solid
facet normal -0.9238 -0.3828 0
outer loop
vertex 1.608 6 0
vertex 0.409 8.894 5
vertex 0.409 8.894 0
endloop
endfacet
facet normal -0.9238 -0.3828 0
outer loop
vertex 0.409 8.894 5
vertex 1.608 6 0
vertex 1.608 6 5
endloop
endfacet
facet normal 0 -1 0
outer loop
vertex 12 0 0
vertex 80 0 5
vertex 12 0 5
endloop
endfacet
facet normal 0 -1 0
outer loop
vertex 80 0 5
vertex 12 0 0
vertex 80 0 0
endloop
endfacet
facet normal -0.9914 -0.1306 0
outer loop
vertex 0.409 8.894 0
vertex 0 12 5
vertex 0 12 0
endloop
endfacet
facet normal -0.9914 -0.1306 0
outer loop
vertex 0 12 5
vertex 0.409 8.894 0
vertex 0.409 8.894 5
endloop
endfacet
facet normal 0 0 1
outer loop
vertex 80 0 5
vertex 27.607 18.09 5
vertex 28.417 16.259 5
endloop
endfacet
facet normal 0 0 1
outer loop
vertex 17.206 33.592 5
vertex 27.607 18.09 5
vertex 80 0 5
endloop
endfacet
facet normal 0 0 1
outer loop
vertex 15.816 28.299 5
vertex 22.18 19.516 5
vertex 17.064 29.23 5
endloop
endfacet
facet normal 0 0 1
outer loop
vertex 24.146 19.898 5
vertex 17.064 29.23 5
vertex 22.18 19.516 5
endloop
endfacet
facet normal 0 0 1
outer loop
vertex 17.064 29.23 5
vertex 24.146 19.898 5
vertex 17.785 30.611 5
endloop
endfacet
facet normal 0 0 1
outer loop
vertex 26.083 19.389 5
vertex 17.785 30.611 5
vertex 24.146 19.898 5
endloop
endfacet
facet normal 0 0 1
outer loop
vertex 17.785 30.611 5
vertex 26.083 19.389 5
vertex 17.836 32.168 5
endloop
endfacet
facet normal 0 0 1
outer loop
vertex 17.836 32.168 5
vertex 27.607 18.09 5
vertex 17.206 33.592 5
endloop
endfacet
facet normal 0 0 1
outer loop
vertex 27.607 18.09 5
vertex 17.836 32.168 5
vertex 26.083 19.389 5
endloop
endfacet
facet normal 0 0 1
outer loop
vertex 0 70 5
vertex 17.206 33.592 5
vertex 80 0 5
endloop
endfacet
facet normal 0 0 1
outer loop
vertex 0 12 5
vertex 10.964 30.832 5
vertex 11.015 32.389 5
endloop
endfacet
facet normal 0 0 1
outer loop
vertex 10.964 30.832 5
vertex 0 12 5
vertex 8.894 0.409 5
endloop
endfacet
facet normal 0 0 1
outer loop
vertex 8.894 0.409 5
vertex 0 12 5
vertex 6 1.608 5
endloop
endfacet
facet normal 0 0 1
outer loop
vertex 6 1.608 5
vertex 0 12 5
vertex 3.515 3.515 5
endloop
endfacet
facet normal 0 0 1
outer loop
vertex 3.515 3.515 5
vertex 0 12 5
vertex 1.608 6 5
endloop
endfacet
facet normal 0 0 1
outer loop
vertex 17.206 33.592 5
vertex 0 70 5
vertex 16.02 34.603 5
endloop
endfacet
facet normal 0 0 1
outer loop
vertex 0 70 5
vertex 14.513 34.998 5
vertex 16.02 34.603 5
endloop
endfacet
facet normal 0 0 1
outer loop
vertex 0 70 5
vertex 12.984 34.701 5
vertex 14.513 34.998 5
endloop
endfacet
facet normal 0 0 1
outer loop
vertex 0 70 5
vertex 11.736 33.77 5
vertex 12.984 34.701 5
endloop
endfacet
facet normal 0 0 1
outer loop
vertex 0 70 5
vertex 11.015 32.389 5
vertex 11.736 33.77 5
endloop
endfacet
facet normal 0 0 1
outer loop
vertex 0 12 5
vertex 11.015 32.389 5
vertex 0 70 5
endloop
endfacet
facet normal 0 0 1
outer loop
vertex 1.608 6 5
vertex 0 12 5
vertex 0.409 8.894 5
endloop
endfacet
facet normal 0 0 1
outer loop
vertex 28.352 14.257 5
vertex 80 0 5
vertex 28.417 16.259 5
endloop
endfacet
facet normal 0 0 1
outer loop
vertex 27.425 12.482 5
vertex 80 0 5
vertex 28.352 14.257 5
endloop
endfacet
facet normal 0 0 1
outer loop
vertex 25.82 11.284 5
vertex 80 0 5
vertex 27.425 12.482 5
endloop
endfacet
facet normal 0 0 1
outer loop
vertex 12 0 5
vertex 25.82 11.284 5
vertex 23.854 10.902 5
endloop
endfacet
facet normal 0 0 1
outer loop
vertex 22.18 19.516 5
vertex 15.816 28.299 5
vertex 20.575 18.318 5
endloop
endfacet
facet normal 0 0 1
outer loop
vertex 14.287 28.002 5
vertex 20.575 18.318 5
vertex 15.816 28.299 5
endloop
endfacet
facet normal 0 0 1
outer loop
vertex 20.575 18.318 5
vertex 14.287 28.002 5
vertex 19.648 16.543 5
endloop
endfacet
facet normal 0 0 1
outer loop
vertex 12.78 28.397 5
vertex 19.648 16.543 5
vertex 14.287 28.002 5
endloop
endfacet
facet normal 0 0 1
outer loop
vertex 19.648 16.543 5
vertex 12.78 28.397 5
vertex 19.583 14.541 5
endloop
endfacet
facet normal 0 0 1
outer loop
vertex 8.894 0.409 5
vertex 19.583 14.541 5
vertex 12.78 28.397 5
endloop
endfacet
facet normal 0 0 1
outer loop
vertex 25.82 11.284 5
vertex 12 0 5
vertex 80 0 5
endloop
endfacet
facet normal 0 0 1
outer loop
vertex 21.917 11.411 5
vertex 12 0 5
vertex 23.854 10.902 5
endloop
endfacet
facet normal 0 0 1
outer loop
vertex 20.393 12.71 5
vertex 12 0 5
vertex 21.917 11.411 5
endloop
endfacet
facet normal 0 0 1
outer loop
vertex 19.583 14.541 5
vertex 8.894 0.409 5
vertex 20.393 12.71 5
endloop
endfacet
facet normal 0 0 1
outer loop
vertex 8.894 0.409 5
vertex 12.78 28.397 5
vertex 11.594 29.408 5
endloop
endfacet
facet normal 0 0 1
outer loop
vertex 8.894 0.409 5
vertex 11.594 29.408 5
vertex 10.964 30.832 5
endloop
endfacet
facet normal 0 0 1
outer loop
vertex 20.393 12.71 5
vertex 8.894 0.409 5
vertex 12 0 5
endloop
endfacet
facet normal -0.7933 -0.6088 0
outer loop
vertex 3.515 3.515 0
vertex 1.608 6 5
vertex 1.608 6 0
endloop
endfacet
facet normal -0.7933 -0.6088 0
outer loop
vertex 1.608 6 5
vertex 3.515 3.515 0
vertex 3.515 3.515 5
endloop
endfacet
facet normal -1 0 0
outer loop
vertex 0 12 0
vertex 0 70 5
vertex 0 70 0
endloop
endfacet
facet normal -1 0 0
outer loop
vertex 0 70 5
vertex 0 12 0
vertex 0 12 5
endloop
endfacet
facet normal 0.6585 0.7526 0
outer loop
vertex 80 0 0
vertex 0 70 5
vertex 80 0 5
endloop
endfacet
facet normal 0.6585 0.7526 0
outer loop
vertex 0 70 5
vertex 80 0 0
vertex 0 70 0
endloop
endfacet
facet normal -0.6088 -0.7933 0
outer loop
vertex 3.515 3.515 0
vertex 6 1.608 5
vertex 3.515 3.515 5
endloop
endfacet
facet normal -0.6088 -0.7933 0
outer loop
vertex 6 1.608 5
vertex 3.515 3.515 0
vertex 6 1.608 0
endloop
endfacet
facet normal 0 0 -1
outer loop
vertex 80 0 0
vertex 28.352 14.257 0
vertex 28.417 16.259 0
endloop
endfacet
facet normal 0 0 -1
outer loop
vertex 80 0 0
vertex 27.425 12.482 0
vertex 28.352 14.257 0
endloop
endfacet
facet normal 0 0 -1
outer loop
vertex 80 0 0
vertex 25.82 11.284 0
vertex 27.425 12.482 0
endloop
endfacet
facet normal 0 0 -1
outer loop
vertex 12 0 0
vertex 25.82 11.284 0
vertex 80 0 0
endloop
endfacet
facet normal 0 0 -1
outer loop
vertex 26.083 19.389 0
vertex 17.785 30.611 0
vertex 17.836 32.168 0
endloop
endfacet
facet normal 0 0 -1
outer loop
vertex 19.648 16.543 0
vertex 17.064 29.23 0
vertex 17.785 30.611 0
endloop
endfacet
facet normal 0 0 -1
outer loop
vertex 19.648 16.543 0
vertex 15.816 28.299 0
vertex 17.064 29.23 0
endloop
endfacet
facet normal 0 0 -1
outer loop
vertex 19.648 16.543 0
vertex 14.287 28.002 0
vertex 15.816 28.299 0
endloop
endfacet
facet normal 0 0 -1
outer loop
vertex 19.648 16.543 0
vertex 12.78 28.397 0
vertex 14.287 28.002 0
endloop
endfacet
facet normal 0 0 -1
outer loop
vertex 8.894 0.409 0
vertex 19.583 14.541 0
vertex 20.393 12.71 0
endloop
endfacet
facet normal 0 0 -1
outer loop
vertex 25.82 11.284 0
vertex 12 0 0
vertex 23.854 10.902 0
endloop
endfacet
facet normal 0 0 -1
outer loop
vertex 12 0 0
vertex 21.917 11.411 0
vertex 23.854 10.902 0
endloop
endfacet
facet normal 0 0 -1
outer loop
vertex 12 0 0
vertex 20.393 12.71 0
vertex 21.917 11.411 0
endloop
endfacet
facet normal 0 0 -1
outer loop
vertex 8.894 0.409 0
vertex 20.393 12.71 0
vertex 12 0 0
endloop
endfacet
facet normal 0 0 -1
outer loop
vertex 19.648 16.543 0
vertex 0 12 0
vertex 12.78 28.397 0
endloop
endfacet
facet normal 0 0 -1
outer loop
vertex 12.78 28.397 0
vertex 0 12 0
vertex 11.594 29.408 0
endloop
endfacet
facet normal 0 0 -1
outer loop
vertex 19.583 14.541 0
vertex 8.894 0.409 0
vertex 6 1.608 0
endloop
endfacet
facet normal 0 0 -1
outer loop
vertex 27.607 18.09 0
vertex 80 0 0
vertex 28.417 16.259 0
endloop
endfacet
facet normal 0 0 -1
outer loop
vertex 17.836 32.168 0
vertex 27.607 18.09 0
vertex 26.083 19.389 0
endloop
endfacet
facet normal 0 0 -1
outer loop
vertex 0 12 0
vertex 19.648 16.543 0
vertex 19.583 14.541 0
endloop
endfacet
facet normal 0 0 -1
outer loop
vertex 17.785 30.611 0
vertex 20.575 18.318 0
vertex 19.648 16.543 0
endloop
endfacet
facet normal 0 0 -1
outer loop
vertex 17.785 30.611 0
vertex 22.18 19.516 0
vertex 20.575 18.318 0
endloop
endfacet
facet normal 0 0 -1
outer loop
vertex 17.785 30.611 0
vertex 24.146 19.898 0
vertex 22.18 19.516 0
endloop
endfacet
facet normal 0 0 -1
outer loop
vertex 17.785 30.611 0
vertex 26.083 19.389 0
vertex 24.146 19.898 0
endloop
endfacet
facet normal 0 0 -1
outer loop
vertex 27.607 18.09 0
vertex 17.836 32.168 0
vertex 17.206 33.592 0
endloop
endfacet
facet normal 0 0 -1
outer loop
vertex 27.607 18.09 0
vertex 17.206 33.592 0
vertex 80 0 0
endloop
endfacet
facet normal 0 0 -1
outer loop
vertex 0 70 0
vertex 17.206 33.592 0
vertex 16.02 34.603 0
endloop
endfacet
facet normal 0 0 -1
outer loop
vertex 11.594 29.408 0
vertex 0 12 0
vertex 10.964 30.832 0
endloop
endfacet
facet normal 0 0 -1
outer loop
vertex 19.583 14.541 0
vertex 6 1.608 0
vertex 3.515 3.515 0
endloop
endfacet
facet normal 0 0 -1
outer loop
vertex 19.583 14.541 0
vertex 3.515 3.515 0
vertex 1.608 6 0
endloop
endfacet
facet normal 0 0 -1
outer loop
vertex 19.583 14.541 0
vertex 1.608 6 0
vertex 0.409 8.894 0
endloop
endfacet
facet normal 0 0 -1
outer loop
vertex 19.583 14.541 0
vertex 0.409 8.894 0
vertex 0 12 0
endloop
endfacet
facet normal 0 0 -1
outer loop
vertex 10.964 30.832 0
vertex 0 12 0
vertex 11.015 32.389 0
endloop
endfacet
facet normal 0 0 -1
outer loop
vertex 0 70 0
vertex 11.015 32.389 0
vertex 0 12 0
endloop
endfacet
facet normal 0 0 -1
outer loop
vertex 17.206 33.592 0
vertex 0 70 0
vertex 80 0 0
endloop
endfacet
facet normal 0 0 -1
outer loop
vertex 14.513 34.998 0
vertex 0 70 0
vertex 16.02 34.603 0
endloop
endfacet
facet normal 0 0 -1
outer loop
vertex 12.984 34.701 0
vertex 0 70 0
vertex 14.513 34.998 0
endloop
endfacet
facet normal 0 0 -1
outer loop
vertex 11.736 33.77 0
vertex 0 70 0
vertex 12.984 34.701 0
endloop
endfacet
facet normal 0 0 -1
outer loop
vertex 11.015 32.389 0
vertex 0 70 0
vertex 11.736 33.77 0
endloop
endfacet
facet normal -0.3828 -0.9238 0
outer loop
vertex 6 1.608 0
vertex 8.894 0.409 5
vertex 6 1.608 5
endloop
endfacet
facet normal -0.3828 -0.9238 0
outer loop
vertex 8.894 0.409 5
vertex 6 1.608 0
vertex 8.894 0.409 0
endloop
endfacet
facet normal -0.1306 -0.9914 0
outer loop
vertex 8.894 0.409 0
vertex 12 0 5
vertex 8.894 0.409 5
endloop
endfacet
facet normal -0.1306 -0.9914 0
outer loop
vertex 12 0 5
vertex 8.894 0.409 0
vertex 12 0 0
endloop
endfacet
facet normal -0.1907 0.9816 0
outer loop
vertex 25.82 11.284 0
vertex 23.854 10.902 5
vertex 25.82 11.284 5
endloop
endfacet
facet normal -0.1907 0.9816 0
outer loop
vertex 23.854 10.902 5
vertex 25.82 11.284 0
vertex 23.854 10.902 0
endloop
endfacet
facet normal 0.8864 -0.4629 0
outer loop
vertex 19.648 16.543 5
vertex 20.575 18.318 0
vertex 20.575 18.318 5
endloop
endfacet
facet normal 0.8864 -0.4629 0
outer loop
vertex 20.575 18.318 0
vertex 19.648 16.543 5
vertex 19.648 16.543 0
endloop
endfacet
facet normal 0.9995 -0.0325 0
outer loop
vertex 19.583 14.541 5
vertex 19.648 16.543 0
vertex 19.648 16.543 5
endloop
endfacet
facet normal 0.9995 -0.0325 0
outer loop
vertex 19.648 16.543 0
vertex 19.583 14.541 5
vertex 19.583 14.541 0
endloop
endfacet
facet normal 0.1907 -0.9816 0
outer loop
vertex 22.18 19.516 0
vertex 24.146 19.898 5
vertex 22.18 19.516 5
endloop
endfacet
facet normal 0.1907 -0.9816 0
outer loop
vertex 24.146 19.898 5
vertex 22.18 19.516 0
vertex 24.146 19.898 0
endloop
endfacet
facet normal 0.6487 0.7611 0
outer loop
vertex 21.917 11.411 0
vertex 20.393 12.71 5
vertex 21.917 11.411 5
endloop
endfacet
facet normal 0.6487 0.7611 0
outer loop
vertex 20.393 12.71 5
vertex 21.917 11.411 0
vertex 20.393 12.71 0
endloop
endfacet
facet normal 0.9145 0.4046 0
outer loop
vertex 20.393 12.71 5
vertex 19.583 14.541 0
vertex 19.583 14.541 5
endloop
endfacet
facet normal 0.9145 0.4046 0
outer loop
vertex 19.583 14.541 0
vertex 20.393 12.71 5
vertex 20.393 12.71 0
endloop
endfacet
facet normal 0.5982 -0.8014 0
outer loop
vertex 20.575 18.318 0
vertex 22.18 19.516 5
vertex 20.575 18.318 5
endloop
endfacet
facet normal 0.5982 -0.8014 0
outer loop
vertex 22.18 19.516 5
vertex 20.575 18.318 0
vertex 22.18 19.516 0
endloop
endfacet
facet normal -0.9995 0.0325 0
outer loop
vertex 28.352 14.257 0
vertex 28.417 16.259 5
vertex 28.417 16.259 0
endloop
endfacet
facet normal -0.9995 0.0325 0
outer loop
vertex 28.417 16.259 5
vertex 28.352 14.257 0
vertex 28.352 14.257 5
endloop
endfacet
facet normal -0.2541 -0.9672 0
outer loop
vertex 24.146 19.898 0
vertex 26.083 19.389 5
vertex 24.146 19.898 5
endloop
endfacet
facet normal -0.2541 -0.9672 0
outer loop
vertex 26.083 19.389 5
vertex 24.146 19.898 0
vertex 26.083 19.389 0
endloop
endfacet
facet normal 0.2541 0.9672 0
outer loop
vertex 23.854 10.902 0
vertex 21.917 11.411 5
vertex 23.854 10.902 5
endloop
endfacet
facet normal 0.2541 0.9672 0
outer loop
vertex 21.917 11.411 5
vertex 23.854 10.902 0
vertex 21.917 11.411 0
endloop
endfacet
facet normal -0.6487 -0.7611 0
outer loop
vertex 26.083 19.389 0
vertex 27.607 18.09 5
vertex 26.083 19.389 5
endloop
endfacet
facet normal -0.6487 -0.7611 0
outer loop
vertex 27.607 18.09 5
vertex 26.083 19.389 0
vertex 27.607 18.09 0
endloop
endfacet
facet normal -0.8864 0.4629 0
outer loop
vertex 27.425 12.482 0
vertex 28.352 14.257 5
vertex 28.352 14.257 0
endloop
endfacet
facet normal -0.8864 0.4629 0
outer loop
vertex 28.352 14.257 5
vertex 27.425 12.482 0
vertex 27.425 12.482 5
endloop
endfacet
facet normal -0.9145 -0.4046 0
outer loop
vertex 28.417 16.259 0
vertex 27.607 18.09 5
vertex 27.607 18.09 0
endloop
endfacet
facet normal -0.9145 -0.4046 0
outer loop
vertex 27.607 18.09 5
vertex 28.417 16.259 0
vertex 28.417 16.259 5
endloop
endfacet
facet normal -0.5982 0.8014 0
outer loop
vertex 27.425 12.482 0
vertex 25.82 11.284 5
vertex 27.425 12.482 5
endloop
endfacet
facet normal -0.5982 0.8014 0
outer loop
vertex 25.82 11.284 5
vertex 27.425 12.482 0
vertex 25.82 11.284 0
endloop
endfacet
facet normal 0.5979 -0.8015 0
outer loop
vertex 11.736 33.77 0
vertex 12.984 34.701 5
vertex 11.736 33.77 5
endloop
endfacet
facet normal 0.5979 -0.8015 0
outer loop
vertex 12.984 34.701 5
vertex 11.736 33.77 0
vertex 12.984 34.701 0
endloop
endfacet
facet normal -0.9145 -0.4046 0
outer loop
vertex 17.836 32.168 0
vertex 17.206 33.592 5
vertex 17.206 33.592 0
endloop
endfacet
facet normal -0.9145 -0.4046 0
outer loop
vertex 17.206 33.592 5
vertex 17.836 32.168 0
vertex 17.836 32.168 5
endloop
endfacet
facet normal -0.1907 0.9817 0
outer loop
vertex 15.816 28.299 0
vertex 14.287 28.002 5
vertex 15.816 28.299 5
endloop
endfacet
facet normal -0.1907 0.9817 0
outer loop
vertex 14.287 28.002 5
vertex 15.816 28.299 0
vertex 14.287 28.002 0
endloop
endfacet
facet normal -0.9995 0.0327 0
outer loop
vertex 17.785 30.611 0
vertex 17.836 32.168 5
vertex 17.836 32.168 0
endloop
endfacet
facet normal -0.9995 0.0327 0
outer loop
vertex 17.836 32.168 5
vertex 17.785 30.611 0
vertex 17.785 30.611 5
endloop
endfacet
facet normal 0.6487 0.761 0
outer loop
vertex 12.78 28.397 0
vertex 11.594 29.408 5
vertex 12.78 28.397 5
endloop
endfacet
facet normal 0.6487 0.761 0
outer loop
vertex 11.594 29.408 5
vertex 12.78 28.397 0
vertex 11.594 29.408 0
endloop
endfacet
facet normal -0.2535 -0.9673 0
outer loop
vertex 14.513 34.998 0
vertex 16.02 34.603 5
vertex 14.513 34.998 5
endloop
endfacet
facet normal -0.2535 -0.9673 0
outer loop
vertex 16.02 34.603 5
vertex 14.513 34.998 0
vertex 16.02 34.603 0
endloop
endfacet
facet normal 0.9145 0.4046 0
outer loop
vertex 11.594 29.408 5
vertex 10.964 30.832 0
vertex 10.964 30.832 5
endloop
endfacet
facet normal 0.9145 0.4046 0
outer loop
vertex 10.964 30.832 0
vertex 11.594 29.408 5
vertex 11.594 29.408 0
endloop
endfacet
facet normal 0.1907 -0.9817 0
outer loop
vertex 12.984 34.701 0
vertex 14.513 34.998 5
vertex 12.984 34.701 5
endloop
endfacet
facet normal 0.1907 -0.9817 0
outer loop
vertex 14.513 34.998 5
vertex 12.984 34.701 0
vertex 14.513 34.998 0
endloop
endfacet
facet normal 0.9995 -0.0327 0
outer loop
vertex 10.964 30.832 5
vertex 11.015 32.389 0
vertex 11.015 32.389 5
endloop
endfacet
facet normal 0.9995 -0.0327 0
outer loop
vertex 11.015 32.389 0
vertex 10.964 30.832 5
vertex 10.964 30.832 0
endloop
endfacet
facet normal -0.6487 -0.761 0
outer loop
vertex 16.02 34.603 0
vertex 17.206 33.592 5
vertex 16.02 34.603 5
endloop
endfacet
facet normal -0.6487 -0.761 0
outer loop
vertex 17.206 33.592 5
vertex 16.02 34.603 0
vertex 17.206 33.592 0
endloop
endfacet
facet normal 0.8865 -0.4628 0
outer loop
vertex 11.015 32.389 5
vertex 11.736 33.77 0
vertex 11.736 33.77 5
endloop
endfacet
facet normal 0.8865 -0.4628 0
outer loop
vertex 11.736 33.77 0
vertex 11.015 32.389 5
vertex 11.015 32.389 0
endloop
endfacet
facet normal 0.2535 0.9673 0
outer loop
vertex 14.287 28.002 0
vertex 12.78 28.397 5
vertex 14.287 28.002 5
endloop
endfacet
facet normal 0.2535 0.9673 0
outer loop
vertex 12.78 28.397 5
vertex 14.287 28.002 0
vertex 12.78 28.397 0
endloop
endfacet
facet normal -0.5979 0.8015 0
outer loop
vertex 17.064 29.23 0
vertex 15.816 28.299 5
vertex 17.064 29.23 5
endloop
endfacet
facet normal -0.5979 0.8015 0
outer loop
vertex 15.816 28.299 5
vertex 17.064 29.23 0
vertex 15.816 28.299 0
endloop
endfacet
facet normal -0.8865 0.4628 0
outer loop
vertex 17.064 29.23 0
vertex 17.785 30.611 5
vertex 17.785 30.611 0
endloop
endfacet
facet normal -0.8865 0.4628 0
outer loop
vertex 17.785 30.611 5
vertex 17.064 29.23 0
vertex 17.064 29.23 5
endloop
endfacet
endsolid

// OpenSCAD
$fn = 32;

// ----------------------------------------------------------------------
// Bracket plate: corner pad 80 x 70, fillet R12
// ----------------------------------------------------------------------

// --- parameters (mm) ---
hole_r = 3.5;             // bolt hole radius
plate_t = 5;              // plate thickness, Z (extrusion height)
leg_a = 80;               // base leg
leg_b = 70;               // height leg
fillet_r = 12;            // right-angle fillet radius
fit_tol = 0.1;            // declared fit tolerance (prompt contract)
free_tol = 0.5;           // declared free tolerance (prompt contract)

hole_d1 = 2 * hole_r + 2;
hole_d2 = 2 * hole_r;

profile = [[12, 0], [80, 0], [0, 70], [0, 12], [0.409, 8.894], [1.608, 6], [3.515, 3.515], [6, 1.608], [8.894, 0.409]];  // primary outline, 9 points, counter clockwise
void_1 = [[28.417, 16.259], [27.607, 18.09], [26.083, 19.389], [24.146, 19.898], [22.18, 19.516], [20.575, 18.318], [19.648, 16.543], [19.583, 14.541], [20.393, 12.71], [21.917, 11.411], [23.854, 10.902], [25.82, 11.284], [27.425, 12.482], [28.352, 14.257]];  // mount hole 1, 14 points
void_2 = [[17.836, 32.168], [17.206, 33.592], [16.02, 34.603], [14.513, 34.998], [12.984, 34.701], [11.736, 33.77], [11.015, 32.389], [10.964, 30.832], [11.594, 29.408], [12.78, 28.397], [14.287, 28.002], [15.816, 28.299], [17.064, 29.23], [17.785, 30.611]];  // mount hole 2, 14 points

// --- the one profile operation ---
difference() {
  linear_extrude(height = plate_t) polygon(points = profile);
  translate([0, 0, -1])
    linear_extrude(height = plate_t + 2) polygon(points = void_1);
  translate([0, 0, -1])
    linear_extrude(height = plate_t + 2) polygon(points = void_2);
}
